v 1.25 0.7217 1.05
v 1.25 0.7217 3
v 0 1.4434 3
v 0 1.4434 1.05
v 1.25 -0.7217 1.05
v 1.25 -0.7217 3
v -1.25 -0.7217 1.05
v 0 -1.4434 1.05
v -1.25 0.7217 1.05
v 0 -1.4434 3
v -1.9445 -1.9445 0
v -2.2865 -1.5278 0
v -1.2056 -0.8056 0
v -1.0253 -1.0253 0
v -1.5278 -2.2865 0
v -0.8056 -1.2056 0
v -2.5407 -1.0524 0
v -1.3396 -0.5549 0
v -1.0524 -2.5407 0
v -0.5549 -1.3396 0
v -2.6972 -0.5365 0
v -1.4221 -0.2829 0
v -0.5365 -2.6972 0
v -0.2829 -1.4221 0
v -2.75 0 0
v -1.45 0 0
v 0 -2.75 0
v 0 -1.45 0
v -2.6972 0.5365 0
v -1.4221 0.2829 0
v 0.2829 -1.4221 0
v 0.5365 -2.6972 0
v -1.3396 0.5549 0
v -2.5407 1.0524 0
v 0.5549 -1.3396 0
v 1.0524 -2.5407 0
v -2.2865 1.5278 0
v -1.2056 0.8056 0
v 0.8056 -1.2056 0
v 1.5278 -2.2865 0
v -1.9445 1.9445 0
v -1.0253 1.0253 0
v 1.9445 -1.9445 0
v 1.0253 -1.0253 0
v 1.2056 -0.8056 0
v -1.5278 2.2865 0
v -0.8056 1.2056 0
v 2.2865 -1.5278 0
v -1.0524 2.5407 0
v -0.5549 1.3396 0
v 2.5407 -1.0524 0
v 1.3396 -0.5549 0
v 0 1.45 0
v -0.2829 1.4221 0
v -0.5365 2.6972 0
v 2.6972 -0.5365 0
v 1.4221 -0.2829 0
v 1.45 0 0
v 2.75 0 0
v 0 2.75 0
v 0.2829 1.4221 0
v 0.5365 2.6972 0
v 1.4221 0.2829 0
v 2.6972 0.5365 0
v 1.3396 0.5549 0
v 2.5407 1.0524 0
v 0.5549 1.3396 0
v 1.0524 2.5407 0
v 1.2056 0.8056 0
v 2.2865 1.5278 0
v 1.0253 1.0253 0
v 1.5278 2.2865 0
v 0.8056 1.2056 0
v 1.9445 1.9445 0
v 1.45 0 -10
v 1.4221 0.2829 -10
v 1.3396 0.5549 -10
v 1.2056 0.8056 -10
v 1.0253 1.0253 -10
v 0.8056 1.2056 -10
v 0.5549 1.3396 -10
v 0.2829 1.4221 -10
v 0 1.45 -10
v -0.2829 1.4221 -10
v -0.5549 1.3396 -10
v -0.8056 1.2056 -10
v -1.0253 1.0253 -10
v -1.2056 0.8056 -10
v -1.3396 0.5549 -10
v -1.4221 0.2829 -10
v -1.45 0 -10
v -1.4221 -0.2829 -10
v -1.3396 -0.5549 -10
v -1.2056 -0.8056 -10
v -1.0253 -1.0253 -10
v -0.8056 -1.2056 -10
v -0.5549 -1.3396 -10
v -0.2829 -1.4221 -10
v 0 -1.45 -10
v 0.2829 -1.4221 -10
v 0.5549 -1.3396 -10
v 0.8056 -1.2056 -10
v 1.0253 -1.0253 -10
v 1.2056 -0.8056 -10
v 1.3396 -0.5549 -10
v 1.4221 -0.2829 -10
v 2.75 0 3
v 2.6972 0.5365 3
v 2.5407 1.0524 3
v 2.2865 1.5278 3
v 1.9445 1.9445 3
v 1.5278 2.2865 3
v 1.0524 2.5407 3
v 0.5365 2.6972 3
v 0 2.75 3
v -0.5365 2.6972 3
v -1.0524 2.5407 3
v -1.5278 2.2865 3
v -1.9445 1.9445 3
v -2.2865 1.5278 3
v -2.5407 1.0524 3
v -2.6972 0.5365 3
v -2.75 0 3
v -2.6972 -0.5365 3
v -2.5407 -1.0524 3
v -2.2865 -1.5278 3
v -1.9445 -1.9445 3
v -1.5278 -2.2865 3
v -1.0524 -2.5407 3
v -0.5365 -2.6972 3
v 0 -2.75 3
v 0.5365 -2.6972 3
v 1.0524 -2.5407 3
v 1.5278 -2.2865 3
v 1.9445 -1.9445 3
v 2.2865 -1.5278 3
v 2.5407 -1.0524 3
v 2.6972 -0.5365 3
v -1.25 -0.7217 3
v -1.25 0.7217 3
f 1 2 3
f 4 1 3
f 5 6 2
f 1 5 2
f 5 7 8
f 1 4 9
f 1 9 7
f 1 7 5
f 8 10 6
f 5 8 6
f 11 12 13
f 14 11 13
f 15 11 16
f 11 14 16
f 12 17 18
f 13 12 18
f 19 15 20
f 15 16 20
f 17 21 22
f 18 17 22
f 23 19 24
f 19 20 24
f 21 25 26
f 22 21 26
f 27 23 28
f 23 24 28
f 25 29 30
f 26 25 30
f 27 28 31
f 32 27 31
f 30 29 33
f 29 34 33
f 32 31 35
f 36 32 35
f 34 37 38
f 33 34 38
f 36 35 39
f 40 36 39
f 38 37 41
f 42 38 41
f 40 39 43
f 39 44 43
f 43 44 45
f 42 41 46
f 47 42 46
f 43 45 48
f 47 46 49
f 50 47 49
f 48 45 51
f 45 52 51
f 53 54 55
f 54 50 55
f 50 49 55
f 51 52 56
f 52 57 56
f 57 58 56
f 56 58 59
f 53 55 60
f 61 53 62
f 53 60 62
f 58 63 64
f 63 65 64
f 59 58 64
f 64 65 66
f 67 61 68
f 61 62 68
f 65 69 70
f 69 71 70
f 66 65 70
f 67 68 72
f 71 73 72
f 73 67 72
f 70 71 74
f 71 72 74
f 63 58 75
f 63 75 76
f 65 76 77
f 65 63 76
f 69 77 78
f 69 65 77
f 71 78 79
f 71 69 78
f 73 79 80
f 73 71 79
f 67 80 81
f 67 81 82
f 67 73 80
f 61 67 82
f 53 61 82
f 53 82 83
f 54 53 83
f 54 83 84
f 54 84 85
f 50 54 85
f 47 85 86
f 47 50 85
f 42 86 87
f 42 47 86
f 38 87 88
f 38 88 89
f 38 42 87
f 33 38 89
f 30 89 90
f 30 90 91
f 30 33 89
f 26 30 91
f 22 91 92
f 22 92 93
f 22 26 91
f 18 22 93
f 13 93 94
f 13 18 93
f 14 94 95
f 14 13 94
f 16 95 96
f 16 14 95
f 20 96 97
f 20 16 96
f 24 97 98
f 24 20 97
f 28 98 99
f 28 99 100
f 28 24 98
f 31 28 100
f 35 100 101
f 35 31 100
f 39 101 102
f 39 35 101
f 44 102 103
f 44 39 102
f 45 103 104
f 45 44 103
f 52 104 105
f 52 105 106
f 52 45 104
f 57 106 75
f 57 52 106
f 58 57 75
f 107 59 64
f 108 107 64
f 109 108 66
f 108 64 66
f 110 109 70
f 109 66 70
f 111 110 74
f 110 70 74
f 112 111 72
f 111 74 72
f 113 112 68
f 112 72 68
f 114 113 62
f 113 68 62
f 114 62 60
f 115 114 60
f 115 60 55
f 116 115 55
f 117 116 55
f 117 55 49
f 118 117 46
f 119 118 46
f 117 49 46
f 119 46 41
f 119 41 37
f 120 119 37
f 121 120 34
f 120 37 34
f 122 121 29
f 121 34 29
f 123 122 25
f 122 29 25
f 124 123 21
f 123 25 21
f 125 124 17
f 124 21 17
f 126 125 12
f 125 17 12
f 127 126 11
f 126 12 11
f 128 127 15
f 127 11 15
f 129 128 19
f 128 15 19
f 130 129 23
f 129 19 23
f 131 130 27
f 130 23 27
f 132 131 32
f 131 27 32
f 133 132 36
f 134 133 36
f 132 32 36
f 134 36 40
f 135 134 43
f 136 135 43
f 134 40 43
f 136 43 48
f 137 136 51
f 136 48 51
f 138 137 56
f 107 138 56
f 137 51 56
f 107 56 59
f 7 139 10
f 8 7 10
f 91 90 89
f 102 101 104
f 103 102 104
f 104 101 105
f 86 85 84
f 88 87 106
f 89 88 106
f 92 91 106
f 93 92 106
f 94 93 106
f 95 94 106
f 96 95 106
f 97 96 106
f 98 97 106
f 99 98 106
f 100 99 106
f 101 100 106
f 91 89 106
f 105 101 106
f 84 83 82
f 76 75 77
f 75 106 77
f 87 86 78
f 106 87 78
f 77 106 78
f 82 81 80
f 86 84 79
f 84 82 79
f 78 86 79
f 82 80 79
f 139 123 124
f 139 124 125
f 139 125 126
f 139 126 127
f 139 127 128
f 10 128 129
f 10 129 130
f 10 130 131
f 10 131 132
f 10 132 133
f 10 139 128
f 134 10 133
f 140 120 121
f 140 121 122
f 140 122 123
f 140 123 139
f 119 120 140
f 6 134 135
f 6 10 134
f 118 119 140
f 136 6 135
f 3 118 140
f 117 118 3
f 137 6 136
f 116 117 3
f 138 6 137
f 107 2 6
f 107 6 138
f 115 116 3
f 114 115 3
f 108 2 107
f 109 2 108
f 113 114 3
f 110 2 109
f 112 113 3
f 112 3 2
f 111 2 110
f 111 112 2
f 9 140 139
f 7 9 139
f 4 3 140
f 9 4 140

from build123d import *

# Parameters (mm, degrees)
SKETCH_1_R                     = 1.45
SHANK_THREADS_SIMPLIFIED_DEPTH = 10
SKETCH_2_R                     = 2.75
SOCKET_HEAD_DEPTH              = 3
HEX_SOCKET_DEPTH               = 1.95


with BuildPart() as part:
    # 草图1 → Shank_threads_simplified (new body)
    with BuildSketch(Plane.XY):
        Circle(SKETCH_1_R)
    extrude(amount=-SHANK_THREADS_SIMPLIFIED_DEPTH)

    # 草图2 → Socket_head (add)
    with BuildSketch(Plane.XY):
        Circle(SKETCH_2_R)
    extrude(amount=SOCKET_HEAD_DEPTH)

    # 草图3 → Hex_socket (cut)
    with BuildSketch(Plane.XY.offset(3)):
        Polygon((1.25, 0.721687836), (0, 1.443375673), (-1.25, 0.721687836), (-1.25, -0.721687836), (0, -1.443375673), (1.25, -0.721687836), align=None)
    extrude(amount=-HEX_SOCKET_DEPTH, mode=Mode.SUBTRACT)


solid = part.part
